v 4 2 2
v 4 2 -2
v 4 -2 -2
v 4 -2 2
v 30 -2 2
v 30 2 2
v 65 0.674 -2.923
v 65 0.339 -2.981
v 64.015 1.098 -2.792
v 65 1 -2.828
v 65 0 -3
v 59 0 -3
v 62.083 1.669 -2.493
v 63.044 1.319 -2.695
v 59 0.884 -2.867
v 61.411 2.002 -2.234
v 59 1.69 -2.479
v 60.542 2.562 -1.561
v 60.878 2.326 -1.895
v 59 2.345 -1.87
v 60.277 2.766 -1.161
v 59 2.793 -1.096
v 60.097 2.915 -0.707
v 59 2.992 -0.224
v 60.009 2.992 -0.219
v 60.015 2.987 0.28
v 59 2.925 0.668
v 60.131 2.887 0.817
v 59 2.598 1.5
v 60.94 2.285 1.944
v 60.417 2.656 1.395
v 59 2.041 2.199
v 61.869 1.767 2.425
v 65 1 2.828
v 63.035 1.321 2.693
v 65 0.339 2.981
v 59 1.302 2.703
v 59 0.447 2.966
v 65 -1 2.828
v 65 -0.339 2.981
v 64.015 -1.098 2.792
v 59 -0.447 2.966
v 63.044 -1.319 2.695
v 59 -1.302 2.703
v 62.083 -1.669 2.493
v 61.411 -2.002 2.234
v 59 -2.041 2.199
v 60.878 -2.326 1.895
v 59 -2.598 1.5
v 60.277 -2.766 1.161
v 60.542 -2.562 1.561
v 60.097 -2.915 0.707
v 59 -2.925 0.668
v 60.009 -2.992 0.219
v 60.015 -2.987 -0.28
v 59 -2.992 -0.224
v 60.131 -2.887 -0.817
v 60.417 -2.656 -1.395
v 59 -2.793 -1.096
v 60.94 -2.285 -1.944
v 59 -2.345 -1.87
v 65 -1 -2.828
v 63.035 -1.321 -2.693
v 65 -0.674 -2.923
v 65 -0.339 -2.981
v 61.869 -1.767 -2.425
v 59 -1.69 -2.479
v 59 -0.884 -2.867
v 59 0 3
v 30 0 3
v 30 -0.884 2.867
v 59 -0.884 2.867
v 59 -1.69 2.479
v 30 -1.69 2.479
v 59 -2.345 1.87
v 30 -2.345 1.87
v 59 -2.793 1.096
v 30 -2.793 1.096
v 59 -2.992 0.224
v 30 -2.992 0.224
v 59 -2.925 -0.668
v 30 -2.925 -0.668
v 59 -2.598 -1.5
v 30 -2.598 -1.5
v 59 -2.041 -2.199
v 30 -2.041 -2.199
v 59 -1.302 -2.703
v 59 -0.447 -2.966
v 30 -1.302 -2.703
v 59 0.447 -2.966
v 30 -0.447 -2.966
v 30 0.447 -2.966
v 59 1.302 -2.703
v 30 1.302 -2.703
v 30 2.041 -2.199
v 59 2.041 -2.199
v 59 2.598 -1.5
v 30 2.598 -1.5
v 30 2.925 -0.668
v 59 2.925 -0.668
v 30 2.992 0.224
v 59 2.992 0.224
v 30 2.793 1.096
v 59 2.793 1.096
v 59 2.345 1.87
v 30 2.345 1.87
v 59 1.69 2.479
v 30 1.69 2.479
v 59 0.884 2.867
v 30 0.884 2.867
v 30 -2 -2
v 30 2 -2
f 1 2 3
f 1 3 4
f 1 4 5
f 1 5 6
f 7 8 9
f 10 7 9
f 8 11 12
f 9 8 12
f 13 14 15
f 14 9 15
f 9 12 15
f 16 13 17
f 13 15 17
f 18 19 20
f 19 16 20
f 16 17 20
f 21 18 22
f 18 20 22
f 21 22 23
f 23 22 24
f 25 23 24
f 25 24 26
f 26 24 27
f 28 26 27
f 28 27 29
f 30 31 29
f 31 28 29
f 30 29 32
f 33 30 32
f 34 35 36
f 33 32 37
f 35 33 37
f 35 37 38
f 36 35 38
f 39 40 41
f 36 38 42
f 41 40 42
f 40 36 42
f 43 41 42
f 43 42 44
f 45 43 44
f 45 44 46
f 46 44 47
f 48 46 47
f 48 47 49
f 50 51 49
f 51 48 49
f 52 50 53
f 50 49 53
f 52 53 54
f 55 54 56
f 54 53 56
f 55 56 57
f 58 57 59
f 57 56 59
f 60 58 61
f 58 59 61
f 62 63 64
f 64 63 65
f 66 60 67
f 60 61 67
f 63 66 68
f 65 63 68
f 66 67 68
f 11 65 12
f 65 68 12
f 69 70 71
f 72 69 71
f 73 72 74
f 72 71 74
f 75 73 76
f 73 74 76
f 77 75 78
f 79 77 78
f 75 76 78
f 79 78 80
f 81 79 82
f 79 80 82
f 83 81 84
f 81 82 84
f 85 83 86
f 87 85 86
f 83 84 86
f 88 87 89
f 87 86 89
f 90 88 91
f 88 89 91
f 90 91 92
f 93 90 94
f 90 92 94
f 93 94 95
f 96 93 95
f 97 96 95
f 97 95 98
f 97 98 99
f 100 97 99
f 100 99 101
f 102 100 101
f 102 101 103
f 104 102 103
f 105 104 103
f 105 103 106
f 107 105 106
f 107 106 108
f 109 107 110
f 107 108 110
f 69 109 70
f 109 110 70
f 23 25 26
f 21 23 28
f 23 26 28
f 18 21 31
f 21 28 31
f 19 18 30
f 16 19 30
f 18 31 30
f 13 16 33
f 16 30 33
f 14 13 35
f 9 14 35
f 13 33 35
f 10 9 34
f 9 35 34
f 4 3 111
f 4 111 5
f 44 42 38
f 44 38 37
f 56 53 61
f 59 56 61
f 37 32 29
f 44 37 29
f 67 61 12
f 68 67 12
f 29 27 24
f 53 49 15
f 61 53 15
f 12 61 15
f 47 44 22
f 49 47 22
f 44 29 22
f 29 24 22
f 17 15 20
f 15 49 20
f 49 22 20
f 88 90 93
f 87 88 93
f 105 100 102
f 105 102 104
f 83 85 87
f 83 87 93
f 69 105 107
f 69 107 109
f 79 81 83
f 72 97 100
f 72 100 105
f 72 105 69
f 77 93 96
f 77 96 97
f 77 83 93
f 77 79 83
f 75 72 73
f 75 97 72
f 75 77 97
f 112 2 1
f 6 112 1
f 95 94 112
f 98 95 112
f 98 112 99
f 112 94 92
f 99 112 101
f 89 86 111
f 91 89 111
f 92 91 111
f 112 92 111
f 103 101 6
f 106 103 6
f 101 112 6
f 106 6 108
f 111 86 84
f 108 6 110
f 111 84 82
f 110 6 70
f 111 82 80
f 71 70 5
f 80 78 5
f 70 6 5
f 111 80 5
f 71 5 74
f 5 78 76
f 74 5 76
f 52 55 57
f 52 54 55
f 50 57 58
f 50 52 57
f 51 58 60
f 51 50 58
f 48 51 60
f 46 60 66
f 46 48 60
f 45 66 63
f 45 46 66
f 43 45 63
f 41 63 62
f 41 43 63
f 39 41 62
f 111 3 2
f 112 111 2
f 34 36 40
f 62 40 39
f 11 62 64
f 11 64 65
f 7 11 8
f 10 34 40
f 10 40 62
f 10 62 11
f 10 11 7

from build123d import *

# Parameters (mm, degrees)
SKETCH3_R           = 3
BOSS_EXTRUDE1_DEPTH = 29
SKETCH14_R          = 3
BOSS_EXTRUDE2_DEPTH = 6
CUT_EXTRUDE1_DEPTH  = 66.138314378
SKETCH16_W          = 4
SKETCH16_H          = 4
BOSS_EXTRUDE3_DEPTH = 30
SKETCH19_W          = 4
SKETCH19_H          = 4
CUT_EXTRUDE2_DEPTH  = 4


with BuildPart() as part:
    # Sketch1 → Loft1 section 0
    with BuildSketch(Plane(origin=(0, 0, 0), x_dir=(0, 0, -1), z_dir=(1, 0, 0))):
        with BuildLine():
            Line((-1, -1), (1, -1))
            Line((1, -1), (1, 1))
            Line((1, 1), (-1, 1))
            Line((-1, 1), (-1, -1))
        make_face()
    # Sketch2 → Loft1 section 1
    with BuildSketch(Plane(origin=(30, 0, 0), x_dir=(0, 0, -1), z_dir=(1, 0, 0))):
        with BuildLine():
            Line((-1, -1), (1, -1))
            Line((1, -1), (1, 1))
            Line((1, 1), (-1, 1))
            Line((-1, 1), (-1, -1))
        make_face()
    loft()

    # Sketch3 → Boss-Extrude1 (add)
    with BuildSketch(Plane(origin=(30, 0, 0), x_dir=(0, 0, -1), z_dir=(1, 0, 0))):
        with Locations(Location((0, 0, 0), (0, 0, 180))):
            Circle(SKETCH3_R)
    extrude(amount=BOSS_EXTRUDE1_DEPTH)

    # Sketch16 → Boss-Extrude3 (add)
    with BuildSketch(Plane.ZY):
        Rectangle(SKETCH16_W, SKETCH16_H)
    extrude(amount=-BOSS_EXTRUDE3_DEPTH)

    # Sketch19 → Cut-Extrude2 (cut)
    with BuildSketch(Plane.ZY):
        Rectangle(SKETCH19_W, SKETCH19_H)
    extrude(amount=-CUT_EXTRUDE2_DEPTH, mode=Mode.SUBTRACT)


with BuildPart() as body_2:
    # Sketch14 → Boss-Extrude2 (new body)
    with BuildSketch(Plane(origin=(59, 0, 0), x_dir=(0, 0, -1), z_dir=(1, 0, 0))):
        Circle(SKETCH14_R)
    extrude(amount=BOSS_EXTRUDE2_DEPTH)

    # Sketch15 → Cut-Extrude1 (cut, symmetric)
    with BuildSketch(Plane.XY):
        with BuildLine():
            Line((-45.087249476, 95.874046313), (60, 3))
            ThreePointArc((60, 3), (62.326656962, 1.566642406), (65, 1))
            Line((65, 1), (205.148729836, -4.220345412))
            Line((205.148729836, -4.220345412), (309.320785076, 256.209792687))
            Line((309.320785076, 256.209792687), (59.084805764, 356.304184412))
            Line((59.084805764, 356.304184412), (-45.087249476, 95.874046313))
        make_face()
    cut_extrude1 = extrude(amount=CUT_EXTRUDE1_DEPTH, both=True, mode=Mode.SUBTRACT)

    # Mirror1: Cut-Extrude1 across plane
    add(cut_extrude1.mirror(Plane.ZX), mode=Mode.SUBTRACT)


solid = Compound([part.part, body_2.part])
